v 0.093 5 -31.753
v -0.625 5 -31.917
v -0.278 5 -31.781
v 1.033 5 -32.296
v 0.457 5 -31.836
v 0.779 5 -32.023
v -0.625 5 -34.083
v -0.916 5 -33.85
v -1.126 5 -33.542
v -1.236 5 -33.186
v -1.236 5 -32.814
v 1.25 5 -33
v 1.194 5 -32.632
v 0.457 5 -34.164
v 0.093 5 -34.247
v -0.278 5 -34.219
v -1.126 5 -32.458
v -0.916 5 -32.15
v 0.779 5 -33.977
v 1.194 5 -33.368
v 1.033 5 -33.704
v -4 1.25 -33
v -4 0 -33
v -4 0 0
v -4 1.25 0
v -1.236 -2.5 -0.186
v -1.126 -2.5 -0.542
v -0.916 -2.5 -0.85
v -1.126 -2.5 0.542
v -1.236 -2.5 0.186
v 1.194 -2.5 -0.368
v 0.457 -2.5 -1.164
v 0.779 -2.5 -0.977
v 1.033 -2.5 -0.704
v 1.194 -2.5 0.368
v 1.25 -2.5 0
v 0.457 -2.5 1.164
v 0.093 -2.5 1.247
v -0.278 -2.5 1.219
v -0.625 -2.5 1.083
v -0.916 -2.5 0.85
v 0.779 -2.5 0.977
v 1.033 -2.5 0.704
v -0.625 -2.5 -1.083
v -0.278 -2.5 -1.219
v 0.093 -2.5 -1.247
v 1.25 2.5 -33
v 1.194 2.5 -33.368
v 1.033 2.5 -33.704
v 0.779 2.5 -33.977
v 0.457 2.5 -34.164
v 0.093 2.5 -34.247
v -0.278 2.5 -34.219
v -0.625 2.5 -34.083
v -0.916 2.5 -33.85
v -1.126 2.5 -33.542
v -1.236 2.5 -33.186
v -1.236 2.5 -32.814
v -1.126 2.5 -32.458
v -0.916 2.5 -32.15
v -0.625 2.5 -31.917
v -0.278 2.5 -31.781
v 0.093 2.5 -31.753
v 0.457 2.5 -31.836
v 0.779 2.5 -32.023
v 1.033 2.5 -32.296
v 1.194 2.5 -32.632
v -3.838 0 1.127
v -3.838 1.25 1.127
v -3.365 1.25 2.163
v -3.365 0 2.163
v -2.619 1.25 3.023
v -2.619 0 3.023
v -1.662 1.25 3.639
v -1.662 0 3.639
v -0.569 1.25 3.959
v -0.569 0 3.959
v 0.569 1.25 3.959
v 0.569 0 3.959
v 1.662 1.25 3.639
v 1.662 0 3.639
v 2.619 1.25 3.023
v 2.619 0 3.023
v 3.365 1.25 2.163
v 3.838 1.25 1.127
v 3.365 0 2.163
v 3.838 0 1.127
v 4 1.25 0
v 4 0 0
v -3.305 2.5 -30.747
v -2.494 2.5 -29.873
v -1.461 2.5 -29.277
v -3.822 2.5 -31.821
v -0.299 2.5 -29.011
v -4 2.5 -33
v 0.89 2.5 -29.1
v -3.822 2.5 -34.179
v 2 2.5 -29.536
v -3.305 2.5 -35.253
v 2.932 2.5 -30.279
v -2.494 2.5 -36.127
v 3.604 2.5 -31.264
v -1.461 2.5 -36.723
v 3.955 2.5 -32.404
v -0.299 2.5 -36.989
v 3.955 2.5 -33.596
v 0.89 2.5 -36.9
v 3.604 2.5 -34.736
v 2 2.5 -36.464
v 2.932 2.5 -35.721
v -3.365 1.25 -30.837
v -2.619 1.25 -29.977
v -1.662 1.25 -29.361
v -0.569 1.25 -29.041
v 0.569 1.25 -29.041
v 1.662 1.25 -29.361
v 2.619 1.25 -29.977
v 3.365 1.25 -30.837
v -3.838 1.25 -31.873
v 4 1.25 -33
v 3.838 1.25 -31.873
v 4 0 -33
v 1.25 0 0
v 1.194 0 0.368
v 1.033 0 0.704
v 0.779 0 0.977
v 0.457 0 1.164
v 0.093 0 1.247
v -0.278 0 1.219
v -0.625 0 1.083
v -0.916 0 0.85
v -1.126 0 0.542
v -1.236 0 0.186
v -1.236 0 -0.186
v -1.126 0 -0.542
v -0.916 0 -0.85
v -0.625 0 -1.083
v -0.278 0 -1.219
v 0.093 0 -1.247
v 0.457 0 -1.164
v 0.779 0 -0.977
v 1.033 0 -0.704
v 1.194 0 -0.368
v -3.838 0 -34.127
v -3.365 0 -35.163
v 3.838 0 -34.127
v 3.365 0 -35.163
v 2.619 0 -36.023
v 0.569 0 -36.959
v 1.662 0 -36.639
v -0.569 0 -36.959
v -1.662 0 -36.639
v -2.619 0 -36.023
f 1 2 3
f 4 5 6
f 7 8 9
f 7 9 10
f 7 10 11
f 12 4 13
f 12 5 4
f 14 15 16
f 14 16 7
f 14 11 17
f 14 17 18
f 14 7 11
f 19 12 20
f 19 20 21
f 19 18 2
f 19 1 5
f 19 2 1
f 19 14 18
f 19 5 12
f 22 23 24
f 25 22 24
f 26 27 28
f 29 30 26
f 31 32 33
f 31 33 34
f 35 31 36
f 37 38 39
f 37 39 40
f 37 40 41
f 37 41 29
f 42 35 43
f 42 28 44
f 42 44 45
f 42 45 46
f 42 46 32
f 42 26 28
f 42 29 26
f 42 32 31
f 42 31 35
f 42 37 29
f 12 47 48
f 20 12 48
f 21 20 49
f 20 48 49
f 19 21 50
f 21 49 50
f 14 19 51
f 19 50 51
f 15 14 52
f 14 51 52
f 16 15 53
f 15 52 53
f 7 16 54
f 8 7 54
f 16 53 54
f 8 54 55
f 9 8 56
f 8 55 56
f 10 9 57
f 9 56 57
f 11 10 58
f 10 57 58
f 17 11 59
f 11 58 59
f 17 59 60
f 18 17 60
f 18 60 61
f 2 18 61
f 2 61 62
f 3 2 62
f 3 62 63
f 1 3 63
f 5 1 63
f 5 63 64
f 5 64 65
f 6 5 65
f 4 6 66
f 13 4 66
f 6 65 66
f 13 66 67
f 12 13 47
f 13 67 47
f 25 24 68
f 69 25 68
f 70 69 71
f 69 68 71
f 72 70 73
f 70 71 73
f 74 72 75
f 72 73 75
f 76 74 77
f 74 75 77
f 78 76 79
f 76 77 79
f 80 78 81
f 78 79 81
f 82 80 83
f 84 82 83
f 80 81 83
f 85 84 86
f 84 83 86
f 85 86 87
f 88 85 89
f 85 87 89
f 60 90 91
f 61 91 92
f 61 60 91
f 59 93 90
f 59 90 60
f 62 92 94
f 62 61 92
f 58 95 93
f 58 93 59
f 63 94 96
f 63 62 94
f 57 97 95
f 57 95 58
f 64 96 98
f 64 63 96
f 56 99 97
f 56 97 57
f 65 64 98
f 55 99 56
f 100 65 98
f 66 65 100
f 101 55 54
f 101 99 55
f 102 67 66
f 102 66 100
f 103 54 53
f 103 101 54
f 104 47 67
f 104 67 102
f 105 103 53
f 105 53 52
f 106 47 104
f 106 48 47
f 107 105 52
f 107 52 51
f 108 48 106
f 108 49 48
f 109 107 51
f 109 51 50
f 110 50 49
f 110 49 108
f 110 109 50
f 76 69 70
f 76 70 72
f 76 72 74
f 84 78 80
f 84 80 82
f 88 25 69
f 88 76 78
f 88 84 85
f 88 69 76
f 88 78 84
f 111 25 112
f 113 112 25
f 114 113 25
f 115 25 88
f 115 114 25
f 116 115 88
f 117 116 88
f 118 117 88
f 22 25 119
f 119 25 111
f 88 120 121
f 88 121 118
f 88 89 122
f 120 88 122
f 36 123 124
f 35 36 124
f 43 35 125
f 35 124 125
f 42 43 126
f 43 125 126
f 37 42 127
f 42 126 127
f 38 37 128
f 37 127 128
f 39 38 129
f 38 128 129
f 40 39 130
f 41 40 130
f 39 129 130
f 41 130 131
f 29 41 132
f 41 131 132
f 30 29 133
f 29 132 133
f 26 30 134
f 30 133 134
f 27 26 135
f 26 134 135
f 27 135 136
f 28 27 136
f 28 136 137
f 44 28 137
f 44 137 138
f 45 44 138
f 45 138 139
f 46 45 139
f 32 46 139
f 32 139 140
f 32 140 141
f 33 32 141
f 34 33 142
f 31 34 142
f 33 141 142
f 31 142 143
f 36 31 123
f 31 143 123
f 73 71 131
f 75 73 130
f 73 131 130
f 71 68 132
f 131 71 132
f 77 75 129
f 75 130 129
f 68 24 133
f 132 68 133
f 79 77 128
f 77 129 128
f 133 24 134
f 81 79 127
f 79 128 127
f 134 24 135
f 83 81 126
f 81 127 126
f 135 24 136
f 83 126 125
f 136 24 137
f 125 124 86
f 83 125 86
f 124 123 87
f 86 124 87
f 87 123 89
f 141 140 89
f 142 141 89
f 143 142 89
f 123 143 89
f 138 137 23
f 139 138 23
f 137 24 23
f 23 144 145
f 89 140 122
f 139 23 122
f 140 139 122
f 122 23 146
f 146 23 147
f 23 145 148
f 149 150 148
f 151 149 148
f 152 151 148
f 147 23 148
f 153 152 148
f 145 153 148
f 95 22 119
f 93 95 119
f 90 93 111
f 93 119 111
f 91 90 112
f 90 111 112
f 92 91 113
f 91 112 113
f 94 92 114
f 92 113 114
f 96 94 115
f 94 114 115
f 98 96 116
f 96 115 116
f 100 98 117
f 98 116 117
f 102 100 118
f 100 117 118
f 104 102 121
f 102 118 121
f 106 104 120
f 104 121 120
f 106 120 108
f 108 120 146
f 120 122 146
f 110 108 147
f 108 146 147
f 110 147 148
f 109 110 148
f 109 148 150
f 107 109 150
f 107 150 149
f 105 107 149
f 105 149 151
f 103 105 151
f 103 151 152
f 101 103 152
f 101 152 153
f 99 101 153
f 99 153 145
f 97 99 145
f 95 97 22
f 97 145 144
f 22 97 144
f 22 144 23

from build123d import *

# Parameters (mm, degrees)
BOSS_EXTRUDE1_DEPTH = 2.5
BOSS_EXTRUDE5_DEPTH = 1.25
SKETCH4_R           = 1.25
BOSS_EXTRUDE6_DEPTH = 2.5
SKETCH5_R           = 1.25
BOSS_EXTRUDE7_DEPTH = 2.5


with BuildPart() as part:
    # Sketch1 → Boss-Extrude1 (new body)
    with BuildSketch(Plane(origin=(0, 0, 0), x_dir=(1, 0, 0), z_dir=(0, 1, 0))):
        with BuildLine():
            ThreePointArc((4, 33), (0, 37), (-4, 33))
            ThreePointArc((-4, 33), (0, 29), (4, 33))
        make_face()
    extrude(amount=BOSS_EXTRUDE1_DEPTH)

    # Sketch1<5> → Boss-Extrude5 (add)
    with BuildSketch(Plane(origin=(0, 0, 0), x_dir=(1, 0, 0), z_dir=(0, 1, 0))):
        with BuildLine():
            Line((-4, 33), (-4, 0))
            ThreePointArc((-4, 0), (0, -4), (4, 0))
            Line((4, 0), (4, 33))
            ThreePointArc((4, 33), (0, 29), (-4, 33))
        make_face()
    extrude(amount=BOSS_EXTRUDE5_DEPTH)

    # Sketch4 → Boss-Extrude6 (add)
    with BuildSketch(Plane(origin=(0, 2.5, 0), x_dir=(1, 0, 0), z_dir=(0, 1, 0))):
        with Locations((0, 33)):
            Circle(SKETCH4_R)
    extrude(amount=BOSS_EXTRUDE6_DEPTH)

    # Sketch5 → Boss-Extrude7 (add)
    with BuildSketch(Plane.XZ):
        Circle(SKETCH5_R)
    extrude(amount=BOSS_EXTRUDE7_DEPTH)


solid = part.part
